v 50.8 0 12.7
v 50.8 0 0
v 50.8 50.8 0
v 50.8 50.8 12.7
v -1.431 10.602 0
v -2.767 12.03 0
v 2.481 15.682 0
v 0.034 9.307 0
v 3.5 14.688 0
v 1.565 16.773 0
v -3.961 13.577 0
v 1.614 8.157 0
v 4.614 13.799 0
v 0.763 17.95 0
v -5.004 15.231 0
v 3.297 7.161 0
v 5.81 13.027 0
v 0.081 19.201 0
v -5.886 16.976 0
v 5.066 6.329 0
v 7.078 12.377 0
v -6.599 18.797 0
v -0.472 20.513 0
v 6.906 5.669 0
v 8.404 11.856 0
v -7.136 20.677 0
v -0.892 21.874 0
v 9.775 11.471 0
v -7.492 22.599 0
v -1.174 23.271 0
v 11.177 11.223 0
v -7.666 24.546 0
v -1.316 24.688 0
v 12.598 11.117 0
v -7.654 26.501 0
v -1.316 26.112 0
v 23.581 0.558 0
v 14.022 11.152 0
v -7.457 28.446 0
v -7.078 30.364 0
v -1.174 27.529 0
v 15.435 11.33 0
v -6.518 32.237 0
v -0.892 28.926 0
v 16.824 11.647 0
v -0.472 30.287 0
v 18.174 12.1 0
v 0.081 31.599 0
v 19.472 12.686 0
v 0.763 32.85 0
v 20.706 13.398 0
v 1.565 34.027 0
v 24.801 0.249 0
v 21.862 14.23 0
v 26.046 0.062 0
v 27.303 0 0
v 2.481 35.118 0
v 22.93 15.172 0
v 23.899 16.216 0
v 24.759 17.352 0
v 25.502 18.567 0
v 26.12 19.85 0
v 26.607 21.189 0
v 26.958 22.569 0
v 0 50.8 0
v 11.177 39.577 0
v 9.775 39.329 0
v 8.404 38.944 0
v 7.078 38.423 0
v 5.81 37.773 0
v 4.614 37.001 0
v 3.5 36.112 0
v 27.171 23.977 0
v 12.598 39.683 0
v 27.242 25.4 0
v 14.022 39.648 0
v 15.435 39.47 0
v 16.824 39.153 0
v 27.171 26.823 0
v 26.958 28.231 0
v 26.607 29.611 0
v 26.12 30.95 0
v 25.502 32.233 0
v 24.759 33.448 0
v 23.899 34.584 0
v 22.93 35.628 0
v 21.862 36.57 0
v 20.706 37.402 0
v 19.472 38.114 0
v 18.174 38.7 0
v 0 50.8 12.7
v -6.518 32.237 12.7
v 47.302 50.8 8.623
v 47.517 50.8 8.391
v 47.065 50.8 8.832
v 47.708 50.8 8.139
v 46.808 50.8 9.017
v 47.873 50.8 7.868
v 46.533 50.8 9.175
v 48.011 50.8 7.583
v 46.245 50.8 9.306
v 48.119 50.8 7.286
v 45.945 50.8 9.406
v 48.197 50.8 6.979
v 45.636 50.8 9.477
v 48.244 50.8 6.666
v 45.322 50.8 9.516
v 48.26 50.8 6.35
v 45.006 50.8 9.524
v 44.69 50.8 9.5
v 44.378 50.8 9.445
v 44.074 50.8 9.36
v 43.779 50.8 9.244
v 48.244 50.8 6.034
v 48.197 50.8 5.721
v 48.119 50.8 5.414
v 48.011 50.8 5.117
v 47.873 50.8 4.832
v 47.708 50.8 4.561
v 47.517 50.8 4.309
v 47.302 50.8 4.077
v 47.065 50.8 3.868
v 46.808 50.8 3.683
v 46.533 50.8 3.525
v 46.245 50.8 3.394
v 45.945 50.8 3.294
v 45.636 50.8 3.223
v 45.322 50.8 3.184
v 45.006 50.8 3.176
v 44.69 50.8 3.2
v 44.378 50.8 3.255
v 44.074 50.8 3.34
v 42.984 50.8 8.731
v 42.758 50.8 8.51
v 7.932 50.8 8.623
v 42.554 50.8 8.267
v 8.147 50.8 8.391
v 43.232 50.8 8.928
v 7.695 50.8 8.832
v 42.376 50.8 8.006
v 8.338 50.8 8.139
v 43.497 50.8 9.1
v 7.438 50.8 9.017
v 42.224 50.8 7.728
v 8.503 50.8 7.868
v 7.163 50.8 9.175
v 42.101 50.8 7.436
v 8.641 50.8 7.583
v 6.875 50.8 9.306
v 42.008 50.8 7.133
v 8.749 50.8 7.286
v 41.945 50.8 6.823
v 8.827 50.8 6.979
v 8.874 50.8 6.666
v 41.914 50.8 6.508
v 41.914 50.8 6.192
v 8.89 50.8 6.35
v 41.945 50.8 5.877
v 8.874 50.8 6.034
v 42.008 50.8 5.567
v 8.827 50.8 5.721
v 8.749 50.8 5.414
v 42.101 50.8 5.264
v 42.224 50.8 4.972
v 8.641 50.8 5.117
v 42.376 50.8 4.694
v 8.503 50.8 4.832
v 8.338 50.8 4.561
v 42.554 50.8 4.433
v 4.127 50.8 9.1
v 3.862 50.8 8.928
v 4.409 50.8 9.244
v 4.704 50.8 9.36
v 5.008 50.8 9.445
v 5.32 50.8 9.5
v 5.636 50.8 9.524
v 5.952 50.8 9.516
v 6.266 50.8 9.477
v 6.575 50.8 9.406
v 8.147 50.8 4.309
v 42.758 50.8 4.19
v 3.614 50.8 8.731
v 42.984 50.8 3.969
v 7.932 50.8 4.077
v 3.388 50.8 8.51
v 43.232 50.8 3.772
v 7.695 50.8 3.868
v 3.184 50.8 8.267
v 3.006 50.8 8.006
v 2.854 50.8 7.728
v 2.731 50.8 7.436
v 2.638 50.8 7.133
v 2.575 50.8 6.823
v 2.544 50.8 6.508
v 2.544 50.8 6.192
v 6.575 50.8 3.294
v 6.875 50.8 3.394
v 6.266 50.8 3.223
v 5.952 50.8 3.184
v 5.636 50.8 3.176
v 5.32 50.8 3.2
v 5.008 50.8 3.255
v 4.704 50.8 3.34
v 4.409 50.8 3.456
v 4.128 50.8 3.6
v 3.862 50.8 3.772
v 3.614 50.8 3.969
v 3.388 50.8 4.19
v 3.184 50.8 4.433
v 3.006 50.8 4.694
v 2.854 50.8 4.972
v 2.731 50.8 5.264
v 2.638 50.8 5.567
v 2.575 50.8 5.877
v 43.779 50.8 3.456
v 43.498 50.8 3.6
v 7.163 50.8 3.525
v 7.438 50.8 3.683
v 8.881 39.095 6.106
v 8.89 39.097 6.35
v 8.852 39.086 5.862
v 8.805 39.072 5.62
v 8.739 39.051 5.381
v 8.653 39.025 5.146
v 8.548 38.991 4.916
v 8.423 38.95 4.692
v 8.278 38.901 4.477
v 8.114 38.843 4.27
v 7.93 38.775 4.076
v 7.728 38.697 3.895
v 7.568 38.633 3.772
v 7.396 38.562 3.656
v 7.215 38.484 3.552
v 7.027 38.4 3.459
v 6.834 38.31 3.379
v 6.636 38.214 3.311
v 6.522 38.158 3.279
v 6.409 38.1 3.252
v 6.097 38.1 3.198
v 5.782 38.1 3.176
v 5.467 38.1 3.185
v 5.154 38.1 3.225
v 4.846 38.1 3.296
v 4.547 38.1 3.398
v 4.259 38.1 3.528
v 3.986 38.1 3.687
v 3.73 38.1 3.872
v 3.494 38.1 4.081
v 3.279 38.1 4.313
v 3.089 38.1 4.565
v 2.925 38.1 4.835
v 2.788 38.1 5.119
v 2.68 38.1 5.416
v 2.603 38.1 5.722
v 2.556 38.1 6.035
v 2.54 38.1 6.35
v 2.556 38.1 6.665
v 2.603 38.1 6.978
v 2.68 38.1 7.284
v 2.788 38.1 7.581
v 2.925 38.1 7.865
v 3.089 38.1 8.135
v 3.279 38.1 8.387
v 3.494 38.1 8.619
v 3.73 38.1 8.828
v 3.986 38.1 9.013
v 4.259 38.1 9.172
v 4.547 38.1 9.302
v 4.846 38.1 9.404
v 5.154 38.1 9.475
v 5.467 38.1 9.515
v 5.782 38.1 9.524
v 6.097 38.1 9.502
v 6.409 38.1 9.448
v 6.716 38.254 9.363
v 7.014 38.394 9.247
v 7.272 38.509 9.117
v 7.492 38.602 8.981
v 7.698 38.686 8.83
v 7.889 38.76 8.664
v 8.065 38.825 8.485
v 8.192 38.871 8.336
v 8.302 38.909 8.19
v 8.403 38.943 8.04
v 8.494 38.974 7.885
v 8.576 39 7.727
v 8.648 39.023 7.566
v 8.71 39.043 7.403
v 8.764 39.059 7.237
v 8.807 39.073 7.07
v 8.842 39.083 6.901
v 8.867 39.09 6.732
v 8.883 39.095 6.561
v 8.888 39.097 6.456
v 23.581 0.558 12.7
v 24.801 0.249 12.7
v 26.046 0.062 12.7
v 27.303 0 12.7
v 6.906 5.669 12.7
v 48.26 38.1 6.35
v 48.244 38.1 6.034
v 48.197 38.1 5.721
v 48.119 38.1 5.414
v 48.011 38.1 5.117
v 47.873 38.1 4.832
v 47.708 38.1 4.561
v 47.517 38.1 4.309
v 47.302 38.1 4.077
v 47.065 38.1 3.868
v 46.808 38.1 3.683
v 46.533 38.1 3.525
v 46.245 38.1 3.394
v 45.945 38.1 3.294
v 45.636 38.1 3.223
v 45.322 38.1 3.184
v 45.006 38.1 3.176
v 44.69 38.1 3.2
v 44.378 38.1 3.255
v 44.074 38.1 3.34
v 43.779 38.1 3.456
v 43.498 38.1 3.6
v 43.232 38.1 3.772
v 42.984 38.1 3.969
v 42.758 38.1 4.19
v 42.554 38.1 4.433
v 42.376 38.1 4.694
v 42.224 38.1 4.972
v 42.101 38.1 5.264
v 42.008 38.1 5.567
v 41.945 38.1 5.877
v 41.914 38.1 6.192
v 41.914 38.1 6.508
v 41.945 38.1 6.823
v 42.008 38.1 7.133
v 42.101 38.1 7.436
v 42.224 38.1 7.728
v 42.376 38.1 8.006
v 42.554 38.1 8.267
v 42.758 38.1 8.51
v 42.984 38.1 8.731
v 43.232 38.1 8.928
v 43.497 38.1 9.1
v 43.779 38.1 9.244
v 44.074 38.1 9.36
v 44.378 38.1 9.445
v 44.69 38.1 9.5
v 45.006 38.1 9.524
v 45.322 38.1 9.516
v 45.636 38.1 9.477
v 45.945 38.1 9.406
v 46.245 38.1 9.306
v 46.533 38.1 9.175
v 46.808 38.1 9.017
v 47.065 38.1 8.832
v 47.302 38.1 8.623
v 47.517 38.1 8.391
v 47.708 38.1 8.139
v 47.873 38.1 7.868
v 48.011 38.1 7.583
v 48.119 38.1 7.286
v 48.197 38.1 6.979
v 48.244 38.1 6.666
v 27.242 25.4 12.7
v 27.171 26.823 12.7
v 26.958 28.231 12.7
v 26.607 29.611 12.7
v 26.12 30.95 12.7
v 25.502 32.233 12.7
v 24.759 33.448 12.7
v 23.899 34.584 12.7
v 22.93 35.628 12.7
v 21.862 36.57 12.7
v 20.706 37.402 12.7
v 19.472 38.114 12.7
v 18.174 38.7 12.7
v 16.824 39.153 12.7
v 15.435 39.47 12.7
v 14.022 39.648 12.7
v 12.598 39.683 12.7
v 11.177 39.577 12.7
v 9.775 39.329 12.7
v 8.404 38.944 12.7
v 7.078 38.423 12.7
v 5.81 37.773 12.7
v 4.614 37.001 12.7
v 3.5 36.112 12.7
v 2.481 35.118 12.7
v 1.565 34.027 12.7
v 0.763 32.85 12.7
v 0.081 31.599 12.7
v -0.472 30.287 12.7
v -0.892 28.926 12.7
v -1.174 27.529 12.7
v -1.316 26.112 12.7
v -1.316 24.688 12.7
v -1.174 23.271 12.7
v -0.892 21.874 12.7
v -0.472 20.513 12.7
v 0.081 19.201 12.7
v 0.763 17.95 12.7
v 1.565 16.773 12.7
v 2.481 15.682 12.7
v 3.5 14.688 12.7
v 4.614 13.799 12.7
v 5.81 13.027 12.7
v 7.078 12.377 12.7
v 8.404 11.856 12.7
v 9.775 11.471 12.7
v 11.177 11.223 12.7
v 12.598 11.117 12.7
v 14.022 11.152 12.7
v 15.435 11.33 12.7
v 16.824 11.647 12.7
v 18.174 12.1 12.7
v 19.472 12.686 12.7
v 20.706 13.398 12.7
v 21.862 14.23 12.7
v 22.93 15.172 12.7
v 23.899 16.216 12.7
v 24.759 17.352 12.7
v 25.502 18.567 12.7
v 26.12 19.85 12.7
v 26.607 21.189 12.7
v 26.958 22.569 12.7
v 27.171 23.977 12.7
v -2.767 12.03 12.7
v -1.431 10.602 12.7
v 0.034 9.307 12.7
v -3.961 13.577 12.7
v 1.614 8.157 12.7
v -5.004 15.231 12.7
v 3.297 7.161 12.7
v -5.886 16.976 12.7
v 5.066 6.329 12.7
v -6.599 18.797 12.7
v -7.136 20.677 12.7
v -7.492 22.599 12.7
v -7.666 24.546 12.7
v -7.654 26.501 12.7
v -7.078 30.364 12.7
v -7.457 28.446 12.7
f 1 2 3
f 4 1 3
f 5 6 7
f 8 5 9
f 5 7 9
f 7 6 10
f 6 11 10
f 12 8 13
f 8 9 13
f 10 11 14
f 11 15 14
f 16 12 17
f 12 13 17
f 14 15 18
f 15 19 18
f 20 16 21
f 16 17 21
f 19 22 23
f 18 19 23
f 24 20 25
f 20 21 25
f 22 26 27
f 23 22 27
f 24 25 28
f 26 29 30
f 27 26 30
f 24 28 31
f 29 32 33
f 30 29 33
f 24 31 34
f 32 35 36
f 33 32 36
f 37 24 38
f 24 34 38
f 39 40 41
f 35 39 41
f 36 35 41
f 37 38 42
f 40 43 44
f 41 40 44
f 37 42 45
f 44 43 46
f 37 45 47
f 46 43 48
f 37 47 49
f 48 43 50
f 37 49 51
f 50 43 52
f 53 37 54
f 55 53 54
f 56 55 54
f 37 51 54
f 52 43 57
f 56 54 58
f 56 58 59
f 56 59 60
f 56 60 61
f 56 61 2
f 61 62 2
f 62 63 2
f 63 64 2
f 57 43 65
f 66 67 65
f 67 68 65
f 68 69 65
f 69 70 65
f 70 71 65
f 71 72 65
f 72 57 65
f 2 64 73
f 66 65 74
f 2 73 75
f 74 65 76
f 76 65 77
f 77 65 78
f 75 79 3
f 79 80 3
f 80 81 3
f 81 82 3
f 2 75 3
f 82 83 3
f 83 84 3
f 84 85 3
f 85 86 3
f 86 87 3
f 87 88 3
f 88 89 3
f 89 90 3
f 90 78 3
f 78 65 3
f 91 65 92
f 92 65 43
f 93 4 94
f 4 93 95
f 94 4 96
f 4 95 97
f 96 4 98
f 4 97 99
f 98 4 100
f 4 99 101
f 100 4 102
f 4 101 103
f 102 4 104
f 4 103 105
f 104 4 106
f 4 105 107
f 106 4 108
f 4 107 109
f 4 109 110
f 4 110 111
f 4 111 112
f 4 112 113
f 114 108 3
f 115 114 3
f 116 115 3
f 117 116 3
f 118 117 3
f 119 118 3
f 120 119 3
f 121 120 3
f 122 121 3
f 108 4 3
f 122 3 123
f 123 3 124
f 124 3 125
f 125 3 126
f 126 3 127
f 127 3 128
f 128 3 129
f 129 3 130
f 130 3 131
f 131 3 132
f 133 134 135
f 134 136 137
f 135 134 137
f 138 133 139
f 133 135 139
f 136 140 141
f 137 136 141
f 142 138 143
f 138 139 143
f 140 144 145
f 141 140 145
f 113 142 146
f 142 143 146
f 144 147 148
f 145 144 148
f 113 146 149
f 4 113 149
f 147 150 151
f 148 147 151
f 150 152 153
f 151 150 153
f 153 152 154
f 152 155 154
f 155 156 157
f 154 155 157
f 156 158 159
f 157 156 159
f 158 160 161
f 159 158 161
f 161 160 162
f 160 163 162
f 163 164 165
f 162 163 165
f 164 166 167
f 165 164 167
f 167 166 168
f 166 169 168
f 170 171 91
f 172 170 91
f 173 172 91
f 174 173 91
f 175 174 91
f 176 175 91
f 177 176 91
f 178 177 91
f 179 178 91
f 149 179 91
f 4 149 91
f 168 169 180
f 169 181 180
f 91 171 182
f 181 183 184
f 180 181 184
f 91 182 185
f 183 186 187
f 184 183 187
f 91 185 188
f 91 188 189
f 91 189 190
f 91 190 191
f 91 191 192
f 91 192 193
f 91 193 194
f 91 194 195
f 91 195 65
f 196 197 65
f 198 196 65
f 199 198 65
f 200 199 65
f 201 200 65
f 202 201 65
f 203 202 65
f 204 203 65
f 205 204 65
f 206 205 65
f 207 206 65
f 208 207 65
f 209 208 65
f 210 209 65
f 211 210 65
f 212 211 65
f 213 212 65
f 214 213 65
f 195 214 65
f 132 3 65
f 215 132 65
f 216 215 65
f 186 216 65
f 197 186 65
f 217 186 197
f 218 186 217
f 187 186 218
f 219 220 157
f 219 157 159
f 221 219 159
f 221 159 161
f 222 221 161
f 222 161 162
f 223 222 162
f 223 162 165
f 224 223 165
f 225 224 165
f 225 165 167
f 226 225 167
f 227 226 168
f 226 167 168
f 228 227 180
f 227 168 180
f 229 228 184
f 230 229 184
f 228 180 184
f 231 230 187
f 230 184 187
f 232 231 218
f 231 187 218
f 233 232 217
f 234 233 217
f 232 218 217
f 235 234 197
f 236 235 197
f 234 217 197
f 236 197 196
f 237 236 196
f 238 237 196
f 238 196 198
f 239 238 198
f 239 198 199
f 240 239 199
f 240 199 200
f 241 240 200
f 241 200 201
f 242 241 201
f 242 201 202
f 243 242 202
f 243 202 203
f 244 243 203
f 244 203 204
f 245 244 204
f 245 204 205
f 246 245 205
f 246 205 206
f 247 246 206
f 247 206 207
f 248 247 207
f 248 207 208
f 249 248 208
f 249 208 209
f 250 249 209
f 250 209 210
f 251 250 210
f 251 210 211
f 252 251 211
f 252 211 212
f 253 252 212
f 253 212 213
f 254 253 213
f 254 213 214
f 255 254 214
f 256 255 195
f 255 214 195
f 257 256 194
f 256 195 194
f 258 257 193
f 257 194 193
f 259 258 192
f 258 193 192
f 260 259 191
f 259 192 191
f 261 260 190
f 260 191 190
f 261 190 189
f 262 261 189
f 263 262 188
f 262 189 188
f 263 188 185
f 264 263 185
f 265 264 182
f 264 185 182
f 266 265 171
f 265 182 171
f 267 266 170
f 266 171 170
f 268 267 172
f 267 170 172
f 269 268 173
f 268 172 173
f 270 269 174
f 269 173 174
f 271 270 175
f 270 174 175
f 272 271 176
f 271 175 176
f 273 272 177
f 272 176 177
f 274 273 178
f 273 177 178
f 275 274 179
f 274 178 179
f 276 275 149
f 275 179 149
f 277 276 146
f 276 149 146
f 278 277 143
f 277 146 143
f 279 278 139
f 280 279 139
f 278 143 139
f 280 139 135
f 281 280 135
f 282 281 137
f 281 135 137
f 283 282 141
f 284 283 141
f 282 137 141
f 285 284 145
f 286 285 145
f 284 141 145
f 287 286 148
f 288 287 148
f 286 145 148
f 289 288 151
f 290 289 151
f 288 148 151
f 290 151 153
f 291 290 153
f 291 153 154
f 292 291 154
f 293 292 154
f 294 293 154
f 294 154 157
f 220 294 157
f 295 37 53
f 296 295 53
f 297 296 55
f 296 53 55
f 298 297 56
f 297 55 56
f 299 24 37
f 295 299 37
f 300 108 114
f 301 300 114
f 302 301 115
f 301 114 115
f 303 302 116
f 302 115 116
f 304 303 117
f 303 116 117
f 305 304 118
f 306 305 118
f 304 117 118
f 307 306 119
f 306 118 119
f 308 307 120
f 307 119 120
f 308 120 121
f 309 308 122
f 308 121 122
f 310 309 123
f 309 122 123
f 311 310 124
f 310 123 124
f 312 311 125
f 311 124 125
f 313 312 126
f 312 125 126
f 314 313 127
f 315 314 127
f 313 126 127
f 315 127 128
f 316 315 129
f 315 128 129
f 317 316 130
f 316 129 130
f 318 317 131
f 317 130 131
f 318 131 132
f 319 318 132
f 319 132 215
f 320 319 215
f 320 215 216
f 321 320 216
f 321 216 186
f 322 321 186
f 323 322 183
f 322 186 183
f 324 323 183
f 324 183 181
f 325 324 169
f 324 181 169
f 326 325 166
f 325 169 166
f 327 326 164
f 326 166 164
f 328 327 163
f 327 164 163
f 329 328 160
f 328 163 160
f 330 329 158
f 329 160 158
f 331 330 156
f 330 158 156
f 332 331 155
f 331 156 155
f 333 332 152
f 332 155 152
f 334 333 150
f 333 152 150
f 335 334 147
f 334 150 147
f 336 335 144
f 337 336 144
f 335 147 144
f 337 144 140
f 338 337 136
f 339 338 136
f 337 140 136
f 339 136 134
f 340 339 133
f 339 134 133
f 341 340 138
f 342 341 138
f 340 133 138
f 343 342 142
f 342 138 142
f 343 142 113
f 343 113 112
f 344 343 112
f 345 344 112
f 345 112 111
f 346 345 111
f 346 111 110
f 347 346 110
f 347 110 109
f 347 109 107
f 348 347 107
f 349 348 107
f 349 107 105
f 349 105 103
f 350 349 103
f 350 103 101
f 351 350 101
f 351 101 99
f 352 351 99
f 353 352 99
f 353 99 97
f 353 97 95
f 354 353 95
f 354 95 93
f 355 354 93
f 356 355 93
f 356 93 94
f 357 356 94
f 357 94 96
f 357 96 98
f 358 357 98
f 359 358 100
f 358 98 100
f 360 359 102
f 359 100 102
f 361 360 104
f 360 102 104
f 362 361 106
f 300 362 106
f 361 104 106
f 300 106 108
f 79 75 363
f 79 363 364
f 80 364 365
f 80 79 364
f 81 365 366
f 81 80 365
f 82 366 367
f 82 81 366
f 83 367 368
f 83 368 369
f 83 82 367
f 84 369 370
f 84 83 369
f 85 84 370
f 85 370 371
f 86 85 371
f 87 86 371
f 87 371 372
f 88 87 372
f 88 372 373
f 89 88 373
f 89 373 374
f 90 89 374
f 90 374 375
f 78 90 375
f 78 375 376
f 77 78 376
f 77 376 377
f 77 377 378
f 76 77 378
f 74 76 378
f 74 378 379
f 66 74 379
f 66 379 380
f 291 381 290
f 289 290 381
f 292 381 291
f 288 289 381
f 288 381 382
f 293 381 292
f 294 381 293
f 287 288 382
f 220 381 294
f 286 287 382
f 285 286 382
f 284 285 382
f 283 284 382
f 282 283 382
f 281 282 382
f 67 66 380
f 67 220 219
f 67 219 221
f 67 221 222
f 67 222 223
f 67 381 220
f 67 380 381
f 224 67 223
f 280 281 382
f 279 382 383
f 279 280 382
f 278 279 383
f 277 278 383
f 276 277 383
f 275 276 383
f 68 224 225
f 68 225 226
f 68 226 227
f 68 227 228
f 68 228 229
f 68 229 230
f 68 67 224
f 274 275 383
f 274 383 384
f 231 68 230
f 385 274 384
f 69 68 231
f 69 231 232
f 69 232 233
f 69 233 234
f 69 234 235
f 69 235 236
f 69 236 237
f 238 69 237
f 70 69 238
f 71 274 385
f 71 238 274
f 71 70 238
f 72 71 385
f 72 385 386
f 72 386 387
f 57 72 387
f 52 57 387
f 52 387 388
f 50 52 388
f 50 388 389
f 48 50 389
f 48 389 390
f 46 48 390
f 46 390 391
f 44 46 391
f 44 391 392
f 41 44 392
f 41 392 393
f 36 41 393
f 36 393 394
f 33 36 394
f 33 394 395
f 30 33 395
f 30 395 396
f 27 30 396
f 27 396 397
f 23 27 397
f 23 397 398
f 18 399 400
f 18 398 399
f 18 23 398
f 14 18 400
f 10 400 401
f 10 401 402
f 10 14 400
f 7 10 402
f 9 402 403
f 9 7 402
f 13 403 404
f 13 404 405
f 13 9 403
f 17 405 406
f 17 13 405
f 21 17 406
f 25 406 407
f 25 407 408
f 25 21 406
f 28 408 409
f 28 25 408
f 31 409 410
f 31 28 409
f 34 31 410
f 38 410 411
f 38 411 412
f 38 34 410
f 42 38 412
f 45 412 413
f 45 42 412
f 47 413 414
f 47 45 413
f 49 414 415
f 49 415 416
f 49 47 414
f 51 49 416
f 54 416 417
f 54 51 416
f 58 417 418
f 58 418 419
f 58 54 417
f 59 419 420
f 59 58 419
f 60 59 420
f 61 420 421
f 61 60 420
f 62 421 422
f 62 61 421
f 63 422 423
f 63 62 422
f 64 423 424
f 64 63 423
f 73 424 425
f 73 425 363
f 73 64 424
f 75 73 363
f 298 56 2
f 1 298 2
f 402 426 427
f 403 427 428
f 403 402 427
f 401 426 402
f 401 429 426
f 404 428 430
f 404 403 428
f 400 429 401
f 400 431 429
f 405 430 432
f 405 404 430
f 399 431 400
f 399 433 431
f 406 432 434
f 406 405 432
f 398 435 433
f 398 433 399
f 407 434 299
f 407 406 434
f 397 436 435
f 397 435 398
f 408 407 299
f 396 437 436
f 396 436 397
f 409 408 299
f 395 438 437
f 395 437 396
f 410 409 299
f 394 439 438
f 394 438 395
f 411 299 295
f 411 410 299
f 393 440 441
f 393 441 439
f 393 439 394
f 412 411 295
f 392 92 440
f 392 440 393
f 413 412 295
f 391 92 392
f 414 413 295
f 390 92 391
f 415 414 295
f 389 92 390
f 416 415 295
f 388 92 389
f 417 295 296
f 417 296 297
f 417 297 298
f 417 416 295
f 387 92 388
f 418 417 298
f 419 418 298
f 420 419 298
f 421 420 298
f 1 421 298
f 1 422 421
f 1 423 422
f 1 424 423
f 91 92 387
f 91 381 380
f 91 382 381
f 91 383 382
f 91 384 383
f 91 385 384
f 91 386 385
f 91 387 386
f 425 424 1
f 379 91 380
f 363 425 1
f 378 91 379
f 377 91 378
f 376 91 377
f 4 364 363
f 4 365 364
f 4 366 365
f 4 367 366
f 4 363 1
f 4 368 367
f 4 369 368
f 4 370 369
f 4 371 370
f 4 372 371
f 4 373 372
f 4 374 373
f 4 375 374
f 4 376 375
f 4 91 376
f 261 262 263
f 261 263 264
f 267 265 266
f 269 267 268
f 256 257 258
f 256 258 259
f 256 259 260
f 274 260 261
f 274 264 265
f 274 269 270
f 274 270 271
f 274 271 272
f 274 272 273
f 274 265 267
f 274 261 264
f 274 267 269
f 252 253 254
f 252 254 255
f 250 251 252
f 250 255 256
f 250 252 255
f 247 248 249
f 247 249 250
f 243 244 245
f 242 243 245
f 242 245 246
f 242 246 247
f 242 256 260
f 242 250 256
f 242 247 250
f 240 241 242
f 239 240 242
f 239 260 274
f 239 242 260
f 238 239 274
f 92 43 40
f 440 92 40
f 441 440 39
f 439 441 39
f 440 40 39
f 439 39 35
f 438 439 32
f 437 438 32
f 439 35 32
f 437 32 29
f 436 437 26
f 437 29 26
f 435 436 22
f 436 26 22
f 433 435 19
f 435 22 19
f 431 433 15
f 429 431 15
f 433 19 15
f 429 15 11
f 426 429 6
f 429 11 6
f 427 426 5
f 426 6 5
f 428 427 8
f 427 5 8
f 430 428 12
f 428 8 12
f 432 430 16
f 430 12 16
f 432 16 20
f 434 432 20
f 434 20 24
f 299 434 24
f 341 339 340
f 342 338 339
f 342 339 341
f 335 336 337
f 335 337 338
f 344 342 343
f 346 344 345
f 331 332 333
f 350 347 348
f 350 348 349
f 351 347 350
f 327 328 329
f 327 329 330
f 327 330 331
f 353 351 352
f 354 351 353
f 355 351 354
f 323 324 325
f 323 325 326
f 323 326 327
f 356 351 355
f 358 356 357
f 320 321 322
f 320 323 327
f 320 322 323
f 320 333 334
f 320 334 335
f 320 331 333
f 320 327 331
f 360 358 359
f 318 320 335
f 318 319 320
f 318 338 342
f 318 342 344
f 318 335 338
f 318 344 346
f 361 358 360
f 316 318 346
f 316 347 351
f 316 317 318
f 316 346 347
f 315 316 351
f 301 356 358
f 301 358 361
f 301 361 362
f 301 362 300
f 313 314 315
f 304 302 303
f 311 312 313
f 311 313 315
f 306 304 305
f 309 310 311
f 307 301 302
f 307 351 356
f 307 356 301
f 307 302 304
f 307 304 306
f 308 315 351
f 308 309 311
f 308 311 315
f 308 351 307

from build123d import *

# Parameters (mm, degrees)
SKETCH1_R           = 14.2875
BOSS_EXTRUDE2_DEPTH = 12.7
SKETCH3_R           = 3.175
CUT_EXTRUDE2_DEPTH  = 12.7


with BuildPart() as part:
    # Sketch1 → Boss-Extrude2 (new body)
    with BuildSketch(Plane.XY):
        with BuildLine():
            Line((50.8, 50.8), (0, 50.8))
            Line((0, 50.8), (-6.517989108, 32.237254305))
            ThreePointArc((-6.517989108, 32.237254305), (-5.465821228, 16.093196457), (6.906112814, 5.668566529))
            Line((6.906112814, 5.668566529), (23.580878621, 0.557579402))
            ThreePointArc((23.580878621, 0.557579402), (25.420999377, 0.140168361), (27.302655351, 0))
            Line((27.302655351, 0), (50.8, 0))
            Line((50.8, 0), (50.8, 50.8))
        make_face()
        with Locations((12.954, 25.4)):
            Circle(SKETCH1_R, mode=Mode.SUBTRACT)
    extrude(amount=BOSS_EXTRUDE2_DEPTH)

    # Sketch3 → Cut-Extrude2 (cut)
    with BuildSketch(Plane(origin=(0, 50.8, 0), x_dir=(1, 0, 0), z_dir=(0, 1, 0))):
        with Locations((45.085, -6.35)):
            Circle(SKETCH3_R)
        with Locations((5.715, -6.35)):
            Circle(SKETCH3_R)
    extrude(amount=-CUT_EXTRUDE2_DEPTH, mode=Mode.SUBTRACT)


solid = part.part
